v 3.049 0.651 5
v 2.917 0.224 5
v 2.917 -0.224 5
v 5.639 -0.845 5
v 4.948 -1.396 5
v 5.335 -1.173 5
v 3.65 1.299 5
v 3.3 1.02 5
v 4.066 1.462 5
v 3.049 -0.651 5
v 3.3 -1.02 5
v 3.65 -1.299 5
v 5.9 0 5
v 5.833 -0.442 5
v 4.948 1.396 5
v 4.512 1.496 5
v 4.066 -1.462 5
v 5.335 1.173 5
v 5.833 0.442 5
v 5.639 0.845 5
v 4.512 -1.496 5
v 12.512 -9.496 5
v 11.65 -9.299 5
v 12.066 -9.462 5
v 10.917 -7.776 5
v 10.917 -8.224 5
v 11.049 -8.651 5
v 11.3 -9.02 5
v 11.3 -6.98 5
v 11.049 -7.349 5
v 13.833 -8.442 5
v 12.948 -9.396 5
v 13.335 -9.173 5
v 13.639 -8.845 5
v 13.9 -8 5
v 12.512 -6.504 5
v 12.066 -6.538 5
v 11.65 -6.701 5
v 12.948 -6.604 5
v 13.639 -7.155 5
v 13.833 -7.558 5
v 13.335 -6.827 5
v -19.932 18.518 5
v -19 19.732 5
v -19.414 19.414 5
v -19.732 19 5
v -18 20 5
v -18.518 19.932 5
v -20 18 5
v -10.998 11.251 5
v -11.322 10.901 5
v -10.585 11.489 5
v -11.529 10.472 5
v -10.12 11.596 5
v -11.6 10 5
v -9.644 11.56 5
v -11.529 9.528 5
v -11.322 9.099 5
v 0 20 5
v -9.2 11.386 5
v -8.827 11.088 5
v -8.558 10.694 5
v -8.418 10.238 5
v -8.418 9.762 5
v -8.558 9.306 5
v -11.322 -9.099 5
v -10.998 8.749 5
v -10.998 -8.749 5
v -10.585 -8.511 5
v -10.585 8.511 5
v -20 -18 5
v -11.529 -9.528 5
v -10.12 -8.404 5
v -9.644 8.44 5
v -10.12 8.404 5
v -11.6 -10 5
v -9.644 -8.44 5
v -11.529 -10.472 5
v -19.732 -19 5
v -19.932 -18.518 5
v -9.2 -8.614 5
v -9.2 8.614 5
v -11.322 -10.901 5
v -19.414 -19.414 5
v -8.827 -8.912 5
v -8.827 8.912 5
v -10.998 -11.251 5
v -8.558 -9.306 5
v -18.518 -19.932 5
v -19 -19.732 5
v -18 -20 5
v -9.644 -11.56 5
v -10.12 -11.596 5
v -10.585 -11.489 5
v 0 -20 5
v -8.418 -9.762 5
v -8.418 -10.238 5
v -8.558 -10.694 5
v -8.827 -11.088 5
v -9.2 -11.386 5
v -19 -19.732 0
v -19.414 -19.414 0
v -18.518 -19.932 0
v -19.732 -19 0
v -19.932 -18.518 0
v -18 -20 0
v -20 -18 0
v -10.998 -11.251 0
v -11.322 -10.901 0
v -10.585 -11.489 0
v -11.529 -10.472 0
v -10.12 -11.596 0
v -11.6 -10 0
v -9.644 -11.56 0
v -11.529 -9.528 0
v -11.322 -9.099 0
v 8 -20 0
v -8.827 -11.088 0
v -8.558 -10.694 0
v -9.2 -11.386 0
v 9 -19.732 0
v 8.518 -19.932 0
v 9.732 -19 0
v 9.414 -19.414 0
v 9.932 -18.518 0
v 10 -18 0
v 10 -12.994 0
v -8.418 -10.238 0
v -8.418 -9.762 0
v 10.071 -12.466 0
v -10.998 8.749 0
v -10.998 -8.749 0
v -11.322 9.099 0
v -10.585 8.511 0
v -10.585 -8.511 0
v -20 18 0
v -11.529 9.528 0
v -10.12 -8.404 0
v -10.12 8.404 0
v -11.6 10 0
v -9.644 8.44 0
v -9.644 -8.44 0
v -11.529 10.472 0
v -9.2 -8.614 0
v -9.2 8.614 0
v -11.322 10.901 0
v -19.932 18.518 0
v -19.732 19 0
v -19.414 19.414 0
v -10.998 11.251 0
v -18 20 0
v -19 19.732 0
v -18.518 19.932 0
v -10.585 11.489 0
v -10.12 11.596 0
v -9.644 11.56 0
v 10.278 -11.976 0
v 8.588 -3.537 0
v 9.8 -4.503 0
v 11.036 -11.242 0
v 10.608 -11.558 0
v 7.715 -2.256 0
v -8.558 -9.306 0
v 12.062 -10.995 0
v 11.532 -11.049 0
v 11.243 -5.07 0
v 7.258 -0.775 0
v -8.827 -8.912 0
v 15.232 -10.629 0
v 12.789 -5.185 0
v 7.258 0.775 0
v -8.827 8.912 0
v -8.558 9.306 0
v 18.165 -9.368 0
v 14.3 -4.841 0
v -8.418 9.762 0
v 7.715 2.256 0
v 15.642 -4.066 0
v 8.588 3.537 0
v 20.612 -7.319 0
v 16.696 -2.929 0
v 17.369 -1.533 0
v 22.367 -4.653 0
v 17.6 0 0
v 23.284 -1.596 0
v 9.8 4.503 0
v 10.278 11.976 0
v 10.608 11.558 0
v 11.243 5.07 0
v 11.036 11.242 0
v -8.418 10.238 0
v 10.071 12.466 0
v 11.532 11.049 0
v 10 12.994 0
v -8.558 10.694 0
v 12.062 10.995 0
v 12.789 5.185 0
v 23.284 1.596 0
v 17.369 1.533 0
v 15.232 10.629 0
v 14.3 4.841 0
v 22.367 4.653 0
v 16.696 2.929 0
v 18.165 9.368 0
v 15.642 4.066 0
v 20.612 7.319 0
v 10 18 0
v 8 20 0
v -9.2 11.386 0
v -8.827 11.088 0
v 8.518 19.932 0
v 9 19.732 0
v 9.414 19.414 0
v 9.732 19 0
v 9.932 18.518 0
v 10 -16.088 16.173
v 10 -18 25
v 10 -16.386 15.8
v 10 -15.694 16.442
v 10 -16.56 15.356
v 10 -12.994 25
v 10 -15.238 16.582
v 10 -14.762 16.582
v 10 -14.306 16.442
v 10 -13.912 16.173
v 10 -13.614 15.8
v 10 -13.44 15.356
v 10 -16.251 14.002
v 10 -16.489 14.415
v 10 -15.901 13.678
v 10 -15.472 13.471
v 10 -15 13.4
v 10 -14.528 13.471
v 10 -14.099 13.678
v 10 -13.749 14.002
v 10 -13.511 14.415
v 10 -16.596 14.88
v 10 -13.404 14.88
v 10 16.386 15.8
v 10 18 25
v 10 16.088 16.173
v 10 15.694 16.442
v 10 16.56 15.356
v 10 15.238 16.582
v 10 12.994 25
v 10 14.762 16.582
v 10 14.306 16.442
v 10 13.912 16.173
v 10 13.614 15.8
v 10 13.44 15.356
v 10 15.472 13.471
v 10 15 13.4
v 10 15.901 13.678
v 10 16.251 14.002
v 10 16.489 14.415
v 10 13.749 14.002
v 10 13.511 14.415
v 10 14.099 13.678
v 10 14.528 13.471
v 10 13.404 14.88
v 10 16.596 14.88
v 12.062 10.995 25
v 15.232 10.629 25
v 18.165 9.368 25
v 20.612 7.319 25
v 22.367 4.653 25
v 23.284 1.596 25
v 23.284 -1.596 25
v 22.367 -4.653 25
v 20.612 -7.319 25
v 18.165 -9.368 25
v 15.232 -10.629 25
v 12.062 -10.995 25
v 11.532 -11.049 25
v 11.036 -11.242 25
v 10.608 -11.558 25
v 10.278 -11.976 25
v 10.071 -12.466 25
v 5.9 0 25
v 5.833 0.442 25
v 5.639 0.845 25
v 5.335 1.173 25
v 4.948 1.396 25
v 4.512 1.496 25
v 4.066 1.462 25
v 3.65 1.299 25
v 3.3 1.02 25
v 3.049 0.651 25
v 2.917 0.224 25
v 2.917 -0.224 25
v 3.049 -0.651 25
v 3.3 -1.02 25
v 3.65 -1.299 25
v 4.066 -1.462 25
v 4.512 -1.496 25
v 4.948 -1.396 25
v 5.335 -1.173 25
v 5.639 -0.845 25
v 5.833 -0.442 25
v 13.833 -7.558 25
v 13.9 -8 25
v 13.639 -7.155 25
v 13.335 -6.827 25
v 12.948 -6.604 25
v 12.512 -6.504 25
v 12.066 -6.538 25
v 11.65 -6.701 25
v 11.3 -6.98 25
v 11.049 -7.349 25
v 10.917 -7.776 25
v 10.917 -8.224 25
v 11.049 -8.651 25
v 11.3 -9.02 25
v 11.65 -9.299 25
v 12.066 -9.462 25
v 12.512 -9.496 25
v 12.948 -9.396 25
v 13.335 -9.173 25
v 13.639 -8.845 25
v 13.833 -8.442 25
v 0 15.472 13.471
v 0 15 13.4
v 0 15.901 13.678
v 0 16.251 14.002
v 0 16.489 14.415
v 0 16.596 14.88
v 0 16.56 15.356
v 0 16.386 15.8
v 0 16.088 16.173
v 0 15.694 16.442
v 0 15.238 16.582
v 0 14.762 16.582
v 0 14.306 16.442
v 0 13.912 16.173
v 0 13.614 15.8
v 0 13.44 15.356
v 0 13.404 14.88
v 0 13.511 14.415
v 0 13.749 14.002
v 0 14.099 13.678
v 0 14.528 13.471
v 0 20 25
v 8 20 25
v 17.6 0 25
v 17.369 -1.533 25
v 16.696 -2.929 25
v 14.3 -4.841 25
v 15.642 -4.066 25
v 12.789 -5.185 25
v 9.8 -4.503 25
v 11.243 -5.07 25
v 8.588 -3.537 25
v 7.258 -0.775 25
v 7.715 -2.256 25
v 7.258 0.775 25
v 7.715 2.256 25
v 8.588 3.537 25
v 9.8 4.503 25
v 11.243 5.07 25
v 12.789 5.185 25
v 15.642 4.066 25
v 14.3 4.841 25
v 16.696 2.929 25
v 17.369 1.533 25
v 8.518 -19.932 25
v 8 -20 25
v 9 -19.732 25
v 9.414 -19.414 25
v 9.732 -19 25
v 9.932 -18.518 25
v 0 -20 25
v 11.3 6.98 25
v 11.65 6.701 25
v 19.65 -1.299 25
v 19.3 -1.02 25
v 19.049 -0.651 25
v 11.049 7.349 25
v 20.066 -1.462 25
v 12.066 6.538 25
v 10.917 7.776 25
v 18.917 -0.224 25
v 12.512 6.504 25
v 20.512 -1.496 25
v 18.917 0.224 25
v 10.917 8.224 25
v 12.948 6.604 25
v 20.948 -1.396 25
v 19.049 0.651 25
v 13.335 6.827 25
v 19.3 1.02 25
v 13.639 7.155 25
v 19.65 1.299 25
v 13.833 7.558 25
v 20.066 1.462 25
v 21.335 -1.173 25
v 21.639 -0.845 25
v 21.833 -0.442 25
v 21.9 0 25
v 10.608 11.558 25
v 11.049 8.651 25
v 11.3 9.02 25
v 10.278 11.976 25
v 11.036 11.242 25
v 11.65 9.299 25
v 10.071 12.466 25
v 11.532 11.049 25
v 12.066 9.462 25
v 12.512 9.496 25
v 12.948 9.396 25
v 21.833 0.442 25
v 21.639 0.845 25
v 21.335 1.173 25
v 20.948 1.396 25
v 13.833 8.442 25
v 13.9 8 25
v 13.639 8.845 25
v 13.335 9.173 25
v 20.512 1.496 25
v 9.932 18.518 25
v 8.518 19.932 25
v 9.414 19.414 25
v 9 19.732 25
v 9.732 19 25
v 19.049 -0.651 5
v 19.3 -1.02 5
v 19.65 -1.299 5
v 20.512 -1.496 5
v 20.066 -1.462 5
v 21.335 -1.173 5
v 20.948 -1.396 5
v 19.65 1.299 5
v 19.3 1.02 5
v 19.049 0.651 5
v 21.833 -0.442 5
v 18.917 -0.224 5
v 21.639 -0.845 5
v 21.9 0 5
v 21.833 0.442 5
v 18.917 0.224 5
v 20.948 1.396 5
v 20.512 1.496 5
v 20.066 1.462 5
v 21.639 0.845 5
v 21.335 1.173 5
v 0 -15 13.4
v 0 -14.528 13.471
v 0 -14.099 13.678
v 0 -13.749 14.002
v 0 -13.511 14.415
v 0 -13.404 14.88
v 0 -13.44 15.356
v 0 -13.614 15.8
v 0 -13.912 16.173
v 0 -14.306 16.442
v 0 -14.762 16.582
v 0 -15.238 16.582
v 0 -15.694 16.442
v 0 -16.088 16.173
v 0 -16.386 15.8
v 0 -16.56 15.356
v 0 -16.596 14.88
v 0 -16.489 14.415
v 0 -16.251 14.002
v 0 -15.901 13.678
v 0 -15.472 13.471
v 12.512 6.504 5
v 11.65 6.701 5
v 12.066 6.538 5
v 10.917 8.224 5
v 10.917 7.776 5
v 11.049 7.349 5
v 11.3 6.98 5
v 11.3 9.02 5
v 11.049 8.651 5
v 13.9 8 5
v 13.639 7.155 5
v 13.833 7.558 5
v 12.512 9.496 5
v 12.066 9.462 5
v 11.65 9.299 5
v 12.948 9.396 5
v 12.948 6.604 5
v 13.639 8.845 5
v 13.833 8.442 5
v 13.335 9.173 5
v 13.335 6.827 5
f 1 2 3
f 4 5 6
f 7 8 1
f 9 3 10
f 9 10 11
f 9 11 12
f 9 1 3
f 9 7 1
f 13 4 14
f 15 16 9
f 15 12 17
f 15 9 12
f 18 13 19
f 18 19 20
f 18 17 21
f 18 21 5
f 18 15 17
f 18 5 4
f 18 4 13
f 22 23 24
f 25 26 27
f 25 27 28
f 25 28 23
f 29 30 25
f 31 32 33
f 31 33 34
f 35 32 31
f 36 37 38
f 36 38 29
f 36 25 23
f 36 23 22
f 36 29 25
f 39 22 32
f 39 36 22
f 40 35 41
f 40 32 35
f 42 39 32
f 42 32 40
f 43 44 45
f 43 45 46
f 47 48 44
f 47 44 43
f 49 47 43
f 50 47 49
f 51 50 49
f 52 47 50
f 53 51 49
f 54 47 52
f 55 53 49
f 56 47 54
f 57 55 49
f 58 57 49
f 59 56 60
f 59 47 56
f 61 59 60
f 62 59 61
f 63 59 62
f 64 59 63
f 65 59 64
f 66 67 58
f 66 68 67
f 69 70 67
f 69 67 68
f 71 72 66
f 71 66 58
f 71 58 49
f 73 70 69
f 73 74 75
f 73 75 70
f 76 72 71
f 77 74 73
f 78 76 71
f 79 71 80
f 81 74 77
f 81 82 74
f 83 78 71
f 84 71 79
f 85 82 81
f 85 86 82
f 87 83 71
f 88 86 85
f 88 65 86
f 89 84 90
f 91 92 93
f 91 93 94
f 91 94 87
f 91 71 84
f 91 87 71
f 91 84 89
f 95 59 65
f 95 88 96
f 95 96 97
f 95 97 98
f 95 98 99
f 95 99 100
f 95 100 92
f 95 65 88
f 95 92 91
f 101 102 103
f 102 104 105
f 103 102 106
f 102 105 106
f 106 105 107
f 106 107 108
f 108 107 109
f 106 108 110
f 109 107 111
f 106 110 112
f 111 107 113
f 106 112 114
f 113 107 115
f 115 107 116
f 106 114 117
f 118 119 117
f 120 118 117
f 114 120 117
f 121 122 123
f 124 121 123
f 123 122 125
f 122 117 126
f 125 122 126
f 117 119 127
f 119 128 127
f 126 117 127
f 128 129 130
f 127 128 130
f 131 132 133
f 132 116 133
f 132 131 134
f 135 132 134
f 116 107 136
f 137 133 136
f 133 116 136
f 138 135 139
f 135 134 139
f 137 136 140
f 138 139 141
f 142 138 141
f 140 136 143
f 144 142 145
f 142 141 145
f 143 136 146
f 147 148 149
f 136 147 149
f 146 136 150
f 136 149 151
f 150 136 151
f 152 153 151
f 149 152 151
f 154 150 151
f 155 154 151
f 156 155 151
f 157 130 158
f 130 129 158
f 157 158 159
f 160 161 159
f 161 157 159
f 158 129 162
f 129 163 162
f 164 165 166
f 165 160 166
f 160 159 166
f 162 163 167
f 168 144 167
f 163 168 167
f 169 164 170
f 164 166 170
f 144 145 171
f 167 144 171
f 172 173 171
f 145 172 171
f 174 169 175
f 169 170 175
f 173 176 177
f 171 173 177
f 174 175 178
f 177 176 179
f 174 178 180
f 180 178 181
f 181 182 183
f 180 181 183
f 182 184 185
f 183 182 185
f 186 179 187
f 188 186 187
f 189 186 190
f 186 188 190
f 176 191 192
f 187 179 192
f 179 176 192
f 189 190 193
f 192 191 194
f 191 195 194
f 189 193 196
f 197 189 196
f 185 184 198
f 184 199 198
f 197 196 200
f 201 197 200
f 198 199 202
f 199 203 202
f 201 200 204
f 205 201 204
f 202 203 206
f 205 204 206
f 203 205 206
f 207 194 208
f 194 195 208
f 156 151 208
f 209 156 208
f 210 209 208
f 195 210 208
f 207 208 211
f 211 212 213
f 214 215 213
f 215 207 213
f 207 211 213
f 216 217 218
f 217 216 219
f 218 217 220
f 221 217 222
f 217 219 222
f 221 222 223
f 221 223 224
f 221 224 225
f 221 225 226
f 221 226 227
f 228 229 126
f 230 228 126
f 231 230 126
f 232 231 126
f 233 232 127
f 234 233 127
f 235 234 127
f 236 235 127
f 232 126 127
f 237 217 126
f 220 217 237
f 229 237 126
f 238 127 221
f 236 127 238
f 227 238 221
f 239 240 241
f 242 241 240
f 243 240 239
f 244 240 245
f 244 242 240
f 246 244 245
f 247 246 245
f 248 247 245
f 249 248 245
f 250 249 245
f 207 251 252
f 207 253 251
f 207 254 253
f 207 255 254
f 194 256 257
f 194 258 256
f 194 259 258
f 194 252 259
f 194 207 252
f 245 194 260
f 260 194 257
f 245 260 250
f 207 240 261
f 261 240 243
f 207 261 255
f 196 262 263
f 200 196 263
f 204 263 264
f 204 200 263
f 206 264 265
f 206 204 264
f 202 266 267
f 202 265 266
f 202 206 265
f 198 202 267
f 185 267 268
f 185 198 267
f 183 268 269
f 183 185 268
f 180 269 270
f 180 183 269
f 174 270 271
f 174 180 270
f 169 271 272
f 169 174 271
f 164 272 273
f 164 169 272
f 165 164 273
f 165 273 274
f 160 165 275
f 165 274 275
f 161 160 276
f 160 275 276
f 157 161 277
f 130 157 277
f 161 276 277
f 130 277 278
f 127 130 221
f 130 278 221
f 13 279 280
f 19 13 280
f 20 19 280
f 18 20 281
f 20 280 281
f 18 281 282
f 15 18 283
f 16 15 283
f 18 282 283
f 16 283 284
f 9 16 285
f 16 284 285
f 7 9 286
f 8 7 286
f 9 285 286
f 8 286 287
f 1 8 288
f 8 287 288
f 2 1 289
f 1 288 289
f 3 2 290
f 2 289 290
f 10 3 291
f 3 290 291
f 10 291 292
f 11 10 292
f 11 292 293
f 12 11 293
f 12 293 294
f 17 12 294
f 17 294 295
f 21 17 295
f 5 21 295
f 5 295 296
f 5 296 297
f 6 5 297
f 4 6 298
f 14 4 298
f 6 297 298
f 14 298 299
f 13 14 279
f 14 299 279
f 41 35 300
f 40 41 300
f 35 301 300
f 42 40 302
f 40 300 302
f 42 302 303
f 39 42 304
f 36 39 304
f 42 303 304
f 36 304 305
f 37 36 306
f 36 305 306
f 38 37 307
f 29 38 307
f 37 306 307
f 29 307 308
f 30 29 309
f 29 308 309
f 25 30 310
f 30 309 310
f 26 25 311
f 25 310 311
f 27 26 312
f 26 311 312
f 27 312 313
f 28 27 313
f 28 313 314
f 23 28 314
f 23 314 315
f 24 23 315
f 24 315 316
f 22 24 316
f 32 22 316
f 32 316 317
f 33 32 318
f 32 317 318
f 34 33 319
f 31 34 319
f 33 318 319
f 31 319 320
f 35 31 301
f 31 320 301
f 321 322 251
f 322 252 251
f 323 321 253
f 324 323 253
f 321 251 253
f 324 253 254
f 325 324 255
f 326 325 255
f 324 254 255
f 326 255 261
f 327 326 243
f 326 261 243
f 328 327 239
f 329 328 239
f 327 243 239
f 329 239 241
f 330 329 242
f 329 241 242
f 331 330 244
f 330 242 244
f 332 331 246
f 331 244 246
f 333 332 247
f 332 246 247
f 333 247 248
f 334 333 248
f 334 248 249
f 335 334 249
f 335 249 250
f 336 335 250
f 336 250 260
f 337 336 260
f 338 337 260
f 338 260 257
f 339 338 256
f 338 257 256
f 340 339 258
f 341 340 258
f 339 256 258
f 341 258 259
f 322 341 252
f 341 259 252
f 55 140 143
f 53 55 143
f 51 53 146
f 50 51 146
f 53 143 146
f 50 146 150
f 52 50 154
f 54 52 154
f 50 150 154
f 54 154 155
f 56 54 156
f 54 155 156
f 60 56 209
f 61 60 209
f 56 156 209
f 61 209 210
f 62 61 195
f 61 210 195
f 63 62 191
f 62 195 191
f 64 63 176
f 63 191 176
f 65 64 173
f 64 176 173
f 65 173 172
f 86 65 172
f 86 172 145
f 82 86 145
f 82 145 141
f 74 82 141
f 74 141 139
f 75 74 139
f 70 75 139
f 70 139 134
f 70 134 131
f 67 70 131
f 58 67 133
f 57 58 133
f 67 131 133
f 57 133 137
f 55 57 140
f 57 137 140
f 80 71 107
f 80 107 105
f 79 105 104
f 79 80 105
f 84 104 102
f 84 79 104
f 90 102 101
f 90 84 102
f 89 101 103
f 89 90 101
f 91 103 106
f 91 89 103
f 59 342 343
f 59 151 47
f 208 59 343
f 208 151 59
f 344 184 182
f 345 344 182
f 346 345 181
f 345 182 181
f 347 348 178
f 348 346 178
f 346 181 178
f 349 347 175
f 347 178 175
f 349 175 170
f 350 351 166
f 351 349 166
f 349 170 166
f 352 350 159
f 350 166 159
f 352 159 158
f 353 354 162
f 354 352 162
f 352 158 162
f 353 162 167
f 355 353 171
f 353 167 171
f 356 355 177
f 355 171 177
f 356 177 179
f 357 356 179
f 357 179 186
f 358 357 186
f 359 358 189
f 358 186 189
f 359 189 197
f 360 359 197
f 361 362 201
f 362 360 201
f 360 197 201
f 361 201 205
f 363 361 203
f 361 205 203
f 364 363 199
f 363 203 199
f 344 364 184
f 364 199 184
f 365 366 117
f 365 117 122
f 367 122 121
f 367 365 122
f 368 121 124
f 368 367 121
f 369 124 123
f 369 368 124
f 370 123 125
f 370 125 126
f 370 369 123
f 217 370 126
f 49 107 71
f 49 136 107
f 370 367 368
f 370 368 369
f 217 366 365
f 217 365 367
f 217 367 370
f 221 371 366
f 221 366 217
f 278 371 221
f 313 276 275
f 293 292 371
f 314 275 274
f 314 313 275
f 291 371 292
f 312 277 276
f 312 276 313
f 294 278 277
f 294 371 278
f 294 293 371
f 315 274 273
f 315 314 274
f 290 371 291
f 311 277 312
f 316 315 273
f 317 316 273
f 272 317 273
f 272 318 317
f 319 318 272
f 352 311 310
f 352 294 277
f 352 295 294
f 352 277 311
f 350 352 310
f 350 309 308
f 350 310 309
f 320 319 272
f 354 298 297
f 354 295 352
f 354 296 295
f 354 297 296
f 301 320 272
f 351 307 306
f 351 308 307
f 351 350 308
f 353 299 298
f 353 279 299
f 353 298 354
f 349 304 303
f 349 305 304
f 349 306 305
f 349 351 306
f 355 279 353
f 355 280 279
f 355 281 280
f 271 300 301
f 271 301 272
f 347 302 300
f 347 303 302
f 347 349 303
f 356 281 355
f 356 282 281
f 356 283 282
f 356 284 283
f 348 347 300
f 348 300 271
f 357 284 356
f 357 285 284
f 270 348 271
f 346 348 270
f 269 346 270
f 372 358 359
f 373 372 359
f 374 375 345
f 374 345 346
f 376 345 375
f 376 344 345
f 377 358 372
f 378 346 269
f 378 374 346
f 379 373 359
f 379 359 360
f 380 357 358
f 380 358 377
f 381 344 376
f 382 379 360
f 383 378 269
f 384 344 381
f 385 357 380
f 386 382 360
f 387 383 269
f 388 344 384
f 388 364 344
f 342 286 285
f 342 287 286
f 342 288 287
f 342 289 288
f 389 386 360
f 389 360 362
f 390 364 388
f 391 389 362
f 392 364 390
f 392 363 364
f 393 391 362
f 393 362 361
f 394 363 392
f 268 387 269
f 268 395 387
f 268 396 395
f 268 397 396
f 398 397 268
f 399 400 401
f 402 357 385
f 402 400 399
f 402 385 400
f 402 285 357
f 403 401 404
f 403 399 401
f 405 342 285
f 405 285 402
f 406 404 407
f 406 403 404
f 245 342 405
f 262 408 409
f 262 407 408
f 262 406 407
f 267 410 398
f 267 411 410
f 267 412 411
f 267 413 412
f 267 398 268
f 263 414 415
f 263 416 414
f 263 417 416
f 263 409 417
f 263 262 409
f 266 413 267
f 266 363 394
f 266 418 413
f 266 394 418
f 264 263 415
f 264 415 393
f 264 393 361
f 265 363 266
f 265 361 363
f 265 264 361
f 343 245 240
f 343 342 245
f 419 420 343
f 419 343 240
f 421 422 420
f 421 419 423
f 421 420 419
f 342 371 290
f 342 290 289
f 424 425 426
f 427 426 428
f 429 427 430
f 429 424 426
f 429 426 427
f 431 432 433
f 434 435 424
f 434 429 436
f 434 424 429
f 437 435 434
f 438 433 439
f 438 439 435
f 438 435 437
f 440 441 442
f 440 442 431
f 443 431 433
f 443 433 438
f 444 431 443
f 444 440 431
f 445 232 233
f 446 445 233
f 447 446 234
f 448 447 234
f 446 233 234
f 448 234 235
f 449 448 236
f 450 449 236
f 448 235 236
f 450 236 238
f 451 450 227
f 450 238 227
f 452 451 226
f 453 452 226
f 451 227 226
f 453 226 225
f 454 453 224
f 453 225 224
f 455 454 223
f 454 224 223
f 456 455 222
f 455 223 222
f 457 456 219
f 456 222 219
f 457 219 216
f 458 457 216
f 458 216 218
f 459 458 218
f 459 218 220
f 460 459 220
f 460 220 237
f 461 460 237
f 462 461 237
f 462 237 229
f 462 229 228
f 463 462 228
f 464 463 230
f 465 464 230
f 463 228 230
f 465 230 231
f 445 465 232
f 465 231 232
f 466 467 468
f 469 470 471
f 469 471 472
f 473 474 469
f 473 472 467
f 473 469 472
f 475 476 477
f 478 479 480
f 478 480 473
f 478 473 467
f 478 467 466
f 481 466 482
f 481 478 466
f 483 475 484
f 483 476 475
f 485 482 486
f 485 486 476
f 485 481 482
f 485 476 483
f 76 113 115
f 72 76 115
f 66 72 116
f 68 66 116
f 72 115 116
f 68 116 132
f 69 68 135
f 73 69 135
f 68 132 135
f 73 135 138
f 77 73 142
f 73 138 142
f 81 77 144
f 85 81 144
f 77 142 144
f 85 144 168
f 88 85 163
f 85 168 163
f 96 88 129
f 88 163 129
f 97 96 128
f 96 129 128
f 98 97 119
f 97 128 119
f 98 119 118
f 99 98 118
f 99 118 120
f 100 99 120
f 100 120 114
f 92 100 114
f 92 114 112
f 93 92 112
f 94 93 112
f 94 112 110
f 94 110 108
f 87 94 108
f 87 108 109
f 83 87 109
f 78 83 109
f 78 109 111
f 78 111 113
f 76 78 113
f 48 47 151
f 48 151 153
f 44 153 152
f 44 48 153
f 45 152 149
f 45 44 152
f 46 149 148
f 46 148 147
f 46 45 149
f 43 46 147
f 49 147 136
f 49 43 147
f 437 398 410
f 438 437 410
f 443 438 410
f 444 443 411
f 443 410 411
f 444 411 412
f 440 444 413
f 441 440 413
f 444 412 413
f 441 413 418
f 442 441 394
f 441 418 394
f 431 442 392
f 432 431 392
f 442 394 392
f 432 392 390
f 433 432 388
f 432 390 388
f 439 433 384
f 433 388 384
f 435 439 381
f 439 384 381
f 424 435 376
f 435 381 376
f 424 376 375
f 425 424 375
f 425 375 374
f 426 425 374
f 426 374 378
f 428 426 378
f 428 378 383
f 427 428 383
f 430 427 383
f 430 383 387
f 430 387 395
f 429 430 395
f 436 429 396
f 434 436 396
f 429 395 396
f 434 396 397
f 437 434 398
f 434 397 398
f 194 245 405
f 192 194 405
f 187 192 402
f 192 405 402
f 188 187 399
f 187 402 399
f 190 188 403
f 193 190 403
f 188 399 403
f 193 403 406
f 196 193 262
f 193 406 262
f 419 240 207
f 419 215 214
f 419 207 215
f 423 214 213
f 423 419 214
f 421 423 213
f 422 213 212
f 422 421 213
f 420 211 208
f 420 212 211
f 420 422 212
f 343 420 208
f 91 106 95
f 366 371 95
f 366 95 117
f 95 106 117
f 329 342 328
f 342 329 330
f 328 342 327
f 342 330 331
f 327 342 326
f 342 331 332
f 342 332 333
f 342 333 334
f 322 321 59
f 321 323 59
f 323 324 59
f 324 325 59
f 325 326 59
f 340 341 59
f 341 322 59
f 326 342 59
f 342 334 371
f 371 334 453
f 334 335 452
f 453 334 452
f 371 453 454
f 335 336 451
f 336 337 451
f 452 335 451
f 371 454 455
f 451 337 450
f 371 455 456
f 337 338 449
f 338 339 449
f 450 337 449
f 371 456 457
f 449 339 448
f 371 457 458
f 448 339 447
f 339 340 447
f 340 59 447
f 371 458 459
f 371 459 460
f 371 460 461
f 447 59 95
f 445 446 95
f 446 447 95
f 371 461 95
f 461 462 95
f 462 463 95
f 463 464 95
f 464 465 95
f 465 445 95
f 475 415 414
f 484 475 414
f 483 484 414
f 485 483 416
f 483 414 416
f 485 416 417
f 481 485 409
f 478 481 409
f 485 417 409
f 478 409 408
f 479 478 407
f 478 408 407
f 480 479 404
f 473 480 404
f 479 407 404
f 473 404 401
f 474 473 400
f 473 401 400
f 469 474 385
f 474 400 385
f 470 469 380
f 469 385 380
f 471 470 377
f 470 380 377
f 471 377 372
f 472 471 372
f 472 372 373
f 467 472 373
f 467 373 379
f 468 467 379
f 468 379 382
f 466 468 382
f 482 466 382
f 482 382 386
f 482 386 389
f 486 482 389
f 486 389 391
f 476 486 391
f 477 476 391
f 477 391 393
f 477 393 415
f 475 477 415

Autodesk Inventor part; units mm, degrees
ref_plane "YZ Plane" through (0, 0, 0) normal (1, 0, 0) x (0, 1, 0)
ref_plane "XZ Plane" through (0, 0, 0) normal (0, 1, 0) x (-1, 0, 0)
ref_plane "XY Plane" through (0, 0, 0) normal (0, 0, 1) x (1, 0, 0)
sketch "Skizze1" plane through (0, 0, 0) normal (0, 0, 1) x (1, 0, 0)
  line L0 (0, 20) -> (10, 20)
  line L1 (10, 20) -> (10, 10.735)
  arc A0 (10, -10.735) -> (10, 10.735) centre (12.4, 0) ccw
  line L2 (0, 20) -> (0, -20)
  line L3 (0, -20) -> (10, -20)
  line L4 (10, -20) -> (10, -10.735)
  circle A1 centre (12.4, 0) radius 5.2
  point P0 (0, 0)
  dimension "d0" = 10
  dimension "d1" = 40
  dimension "d2" = 10
  dimension "d3" = 11
  dimension "d4" = 0
  dimension "d5" = 20
  dimension "d6" = 10.4
  dimension "d7" = 12.4
extrude "Extrusion1" add sketch "Skizze1" along normal blind 25
sketch "Skizze2" plane through (0, -20, 0) normal (-1, 0, 0) x (0, 0, 1)
  line L0 (0, 0) -> (25, 0) projected
  line L1 (0, 40) -> (5, 40)
  line L2 (5, 40) -> (5, 0)
  line L3 (5, 0) -> (0, 0)
  line L4 (0, 0) -> (0, 40)
  point P0 (0, 20)
  dimension "d10" = 5
extrude "Extrusion2" add sketch "Skizze2" along normal blind 20
sketch "Skizze3" plane through (0, 0, 0) normal (0, 0, -1) x (-1, 0, 0)
  circle A0 centre (10, -10) radius 1.6
  circle A1 centre (10, 10) radius 1.6
  line L0 (-10, -20) -> (20, -20) projected
  line L1 (20, 20) -> (20, -20) projected
  line L2 (20, 20) -> (-10, 20) projected
  point P0 (0, 0)
  dimension "d13" = 3.2
  dimension "d14" = 3.2
  dimension "d15" = 10
  dimension "d16" = 10
  dimension "d17" = 10
  dimension "d18" = 10
extrude "Extrusion3" cut sketch "Skizze3" against normal through all
fillet "Rundung1" radius 2 6 edges at (10, 20, 12.5) (10, 10.735, 12.5) (10, -10.735, 12.5) (10, -20, 12.5) (-20, -20, 2.5) (-20, 20, 2.5)
sketch "Skizze4" plane through (10, -18, 0) normal (1, 0, 0) x (0, 0, -1)
  circle A0 centre (-15, 3) radius 1.6
  circle A1 centre (-15, 33) radius 1.6
  line L0 (-25, -2) -> (0, -2) projected
  line L1 (-25, 0) -> (-25, 5.0062) projected
  line L2 (0, 38) -> (-25, 38) projected
  line L3 (-25, 30.9938) -> (-25, 36) projected
  point P0 (0, 18)
  dimension "d22" = 3.2
  dimension "d23" = 3.2
  dimension "d24" = 5
  dimension "d25" = 10
  dimension "d26" = 5
  dimension "d27" = 10
extrude "Extrusion4" cut sketch "Skizze4" against normal through all
sketch "Skizze5" plane through (0, 0, 25) normal (0, 0, 1) x (1, 0, 0)
  circle A0 centre (4.4, 0) radius 1.5
  circle A1 centre (12.4, 0) radius 5.2 construction
  circle A2 centre (12.4, -8) radius 1.5
  circle A3 centre (20.4, 0) radius 1.5
  circle A4 centre (12.4, 8) radius 1.5
  point P0 (0, 0)
  dimension "d30" = 3
  dimension "d31" = 8
  dimension "d34" = 360
extrude "Extrusion5" cut sketch "Skizze5" against normal blind 20
properties part number "Z nut mount" material "ABS-Kunststoff"
